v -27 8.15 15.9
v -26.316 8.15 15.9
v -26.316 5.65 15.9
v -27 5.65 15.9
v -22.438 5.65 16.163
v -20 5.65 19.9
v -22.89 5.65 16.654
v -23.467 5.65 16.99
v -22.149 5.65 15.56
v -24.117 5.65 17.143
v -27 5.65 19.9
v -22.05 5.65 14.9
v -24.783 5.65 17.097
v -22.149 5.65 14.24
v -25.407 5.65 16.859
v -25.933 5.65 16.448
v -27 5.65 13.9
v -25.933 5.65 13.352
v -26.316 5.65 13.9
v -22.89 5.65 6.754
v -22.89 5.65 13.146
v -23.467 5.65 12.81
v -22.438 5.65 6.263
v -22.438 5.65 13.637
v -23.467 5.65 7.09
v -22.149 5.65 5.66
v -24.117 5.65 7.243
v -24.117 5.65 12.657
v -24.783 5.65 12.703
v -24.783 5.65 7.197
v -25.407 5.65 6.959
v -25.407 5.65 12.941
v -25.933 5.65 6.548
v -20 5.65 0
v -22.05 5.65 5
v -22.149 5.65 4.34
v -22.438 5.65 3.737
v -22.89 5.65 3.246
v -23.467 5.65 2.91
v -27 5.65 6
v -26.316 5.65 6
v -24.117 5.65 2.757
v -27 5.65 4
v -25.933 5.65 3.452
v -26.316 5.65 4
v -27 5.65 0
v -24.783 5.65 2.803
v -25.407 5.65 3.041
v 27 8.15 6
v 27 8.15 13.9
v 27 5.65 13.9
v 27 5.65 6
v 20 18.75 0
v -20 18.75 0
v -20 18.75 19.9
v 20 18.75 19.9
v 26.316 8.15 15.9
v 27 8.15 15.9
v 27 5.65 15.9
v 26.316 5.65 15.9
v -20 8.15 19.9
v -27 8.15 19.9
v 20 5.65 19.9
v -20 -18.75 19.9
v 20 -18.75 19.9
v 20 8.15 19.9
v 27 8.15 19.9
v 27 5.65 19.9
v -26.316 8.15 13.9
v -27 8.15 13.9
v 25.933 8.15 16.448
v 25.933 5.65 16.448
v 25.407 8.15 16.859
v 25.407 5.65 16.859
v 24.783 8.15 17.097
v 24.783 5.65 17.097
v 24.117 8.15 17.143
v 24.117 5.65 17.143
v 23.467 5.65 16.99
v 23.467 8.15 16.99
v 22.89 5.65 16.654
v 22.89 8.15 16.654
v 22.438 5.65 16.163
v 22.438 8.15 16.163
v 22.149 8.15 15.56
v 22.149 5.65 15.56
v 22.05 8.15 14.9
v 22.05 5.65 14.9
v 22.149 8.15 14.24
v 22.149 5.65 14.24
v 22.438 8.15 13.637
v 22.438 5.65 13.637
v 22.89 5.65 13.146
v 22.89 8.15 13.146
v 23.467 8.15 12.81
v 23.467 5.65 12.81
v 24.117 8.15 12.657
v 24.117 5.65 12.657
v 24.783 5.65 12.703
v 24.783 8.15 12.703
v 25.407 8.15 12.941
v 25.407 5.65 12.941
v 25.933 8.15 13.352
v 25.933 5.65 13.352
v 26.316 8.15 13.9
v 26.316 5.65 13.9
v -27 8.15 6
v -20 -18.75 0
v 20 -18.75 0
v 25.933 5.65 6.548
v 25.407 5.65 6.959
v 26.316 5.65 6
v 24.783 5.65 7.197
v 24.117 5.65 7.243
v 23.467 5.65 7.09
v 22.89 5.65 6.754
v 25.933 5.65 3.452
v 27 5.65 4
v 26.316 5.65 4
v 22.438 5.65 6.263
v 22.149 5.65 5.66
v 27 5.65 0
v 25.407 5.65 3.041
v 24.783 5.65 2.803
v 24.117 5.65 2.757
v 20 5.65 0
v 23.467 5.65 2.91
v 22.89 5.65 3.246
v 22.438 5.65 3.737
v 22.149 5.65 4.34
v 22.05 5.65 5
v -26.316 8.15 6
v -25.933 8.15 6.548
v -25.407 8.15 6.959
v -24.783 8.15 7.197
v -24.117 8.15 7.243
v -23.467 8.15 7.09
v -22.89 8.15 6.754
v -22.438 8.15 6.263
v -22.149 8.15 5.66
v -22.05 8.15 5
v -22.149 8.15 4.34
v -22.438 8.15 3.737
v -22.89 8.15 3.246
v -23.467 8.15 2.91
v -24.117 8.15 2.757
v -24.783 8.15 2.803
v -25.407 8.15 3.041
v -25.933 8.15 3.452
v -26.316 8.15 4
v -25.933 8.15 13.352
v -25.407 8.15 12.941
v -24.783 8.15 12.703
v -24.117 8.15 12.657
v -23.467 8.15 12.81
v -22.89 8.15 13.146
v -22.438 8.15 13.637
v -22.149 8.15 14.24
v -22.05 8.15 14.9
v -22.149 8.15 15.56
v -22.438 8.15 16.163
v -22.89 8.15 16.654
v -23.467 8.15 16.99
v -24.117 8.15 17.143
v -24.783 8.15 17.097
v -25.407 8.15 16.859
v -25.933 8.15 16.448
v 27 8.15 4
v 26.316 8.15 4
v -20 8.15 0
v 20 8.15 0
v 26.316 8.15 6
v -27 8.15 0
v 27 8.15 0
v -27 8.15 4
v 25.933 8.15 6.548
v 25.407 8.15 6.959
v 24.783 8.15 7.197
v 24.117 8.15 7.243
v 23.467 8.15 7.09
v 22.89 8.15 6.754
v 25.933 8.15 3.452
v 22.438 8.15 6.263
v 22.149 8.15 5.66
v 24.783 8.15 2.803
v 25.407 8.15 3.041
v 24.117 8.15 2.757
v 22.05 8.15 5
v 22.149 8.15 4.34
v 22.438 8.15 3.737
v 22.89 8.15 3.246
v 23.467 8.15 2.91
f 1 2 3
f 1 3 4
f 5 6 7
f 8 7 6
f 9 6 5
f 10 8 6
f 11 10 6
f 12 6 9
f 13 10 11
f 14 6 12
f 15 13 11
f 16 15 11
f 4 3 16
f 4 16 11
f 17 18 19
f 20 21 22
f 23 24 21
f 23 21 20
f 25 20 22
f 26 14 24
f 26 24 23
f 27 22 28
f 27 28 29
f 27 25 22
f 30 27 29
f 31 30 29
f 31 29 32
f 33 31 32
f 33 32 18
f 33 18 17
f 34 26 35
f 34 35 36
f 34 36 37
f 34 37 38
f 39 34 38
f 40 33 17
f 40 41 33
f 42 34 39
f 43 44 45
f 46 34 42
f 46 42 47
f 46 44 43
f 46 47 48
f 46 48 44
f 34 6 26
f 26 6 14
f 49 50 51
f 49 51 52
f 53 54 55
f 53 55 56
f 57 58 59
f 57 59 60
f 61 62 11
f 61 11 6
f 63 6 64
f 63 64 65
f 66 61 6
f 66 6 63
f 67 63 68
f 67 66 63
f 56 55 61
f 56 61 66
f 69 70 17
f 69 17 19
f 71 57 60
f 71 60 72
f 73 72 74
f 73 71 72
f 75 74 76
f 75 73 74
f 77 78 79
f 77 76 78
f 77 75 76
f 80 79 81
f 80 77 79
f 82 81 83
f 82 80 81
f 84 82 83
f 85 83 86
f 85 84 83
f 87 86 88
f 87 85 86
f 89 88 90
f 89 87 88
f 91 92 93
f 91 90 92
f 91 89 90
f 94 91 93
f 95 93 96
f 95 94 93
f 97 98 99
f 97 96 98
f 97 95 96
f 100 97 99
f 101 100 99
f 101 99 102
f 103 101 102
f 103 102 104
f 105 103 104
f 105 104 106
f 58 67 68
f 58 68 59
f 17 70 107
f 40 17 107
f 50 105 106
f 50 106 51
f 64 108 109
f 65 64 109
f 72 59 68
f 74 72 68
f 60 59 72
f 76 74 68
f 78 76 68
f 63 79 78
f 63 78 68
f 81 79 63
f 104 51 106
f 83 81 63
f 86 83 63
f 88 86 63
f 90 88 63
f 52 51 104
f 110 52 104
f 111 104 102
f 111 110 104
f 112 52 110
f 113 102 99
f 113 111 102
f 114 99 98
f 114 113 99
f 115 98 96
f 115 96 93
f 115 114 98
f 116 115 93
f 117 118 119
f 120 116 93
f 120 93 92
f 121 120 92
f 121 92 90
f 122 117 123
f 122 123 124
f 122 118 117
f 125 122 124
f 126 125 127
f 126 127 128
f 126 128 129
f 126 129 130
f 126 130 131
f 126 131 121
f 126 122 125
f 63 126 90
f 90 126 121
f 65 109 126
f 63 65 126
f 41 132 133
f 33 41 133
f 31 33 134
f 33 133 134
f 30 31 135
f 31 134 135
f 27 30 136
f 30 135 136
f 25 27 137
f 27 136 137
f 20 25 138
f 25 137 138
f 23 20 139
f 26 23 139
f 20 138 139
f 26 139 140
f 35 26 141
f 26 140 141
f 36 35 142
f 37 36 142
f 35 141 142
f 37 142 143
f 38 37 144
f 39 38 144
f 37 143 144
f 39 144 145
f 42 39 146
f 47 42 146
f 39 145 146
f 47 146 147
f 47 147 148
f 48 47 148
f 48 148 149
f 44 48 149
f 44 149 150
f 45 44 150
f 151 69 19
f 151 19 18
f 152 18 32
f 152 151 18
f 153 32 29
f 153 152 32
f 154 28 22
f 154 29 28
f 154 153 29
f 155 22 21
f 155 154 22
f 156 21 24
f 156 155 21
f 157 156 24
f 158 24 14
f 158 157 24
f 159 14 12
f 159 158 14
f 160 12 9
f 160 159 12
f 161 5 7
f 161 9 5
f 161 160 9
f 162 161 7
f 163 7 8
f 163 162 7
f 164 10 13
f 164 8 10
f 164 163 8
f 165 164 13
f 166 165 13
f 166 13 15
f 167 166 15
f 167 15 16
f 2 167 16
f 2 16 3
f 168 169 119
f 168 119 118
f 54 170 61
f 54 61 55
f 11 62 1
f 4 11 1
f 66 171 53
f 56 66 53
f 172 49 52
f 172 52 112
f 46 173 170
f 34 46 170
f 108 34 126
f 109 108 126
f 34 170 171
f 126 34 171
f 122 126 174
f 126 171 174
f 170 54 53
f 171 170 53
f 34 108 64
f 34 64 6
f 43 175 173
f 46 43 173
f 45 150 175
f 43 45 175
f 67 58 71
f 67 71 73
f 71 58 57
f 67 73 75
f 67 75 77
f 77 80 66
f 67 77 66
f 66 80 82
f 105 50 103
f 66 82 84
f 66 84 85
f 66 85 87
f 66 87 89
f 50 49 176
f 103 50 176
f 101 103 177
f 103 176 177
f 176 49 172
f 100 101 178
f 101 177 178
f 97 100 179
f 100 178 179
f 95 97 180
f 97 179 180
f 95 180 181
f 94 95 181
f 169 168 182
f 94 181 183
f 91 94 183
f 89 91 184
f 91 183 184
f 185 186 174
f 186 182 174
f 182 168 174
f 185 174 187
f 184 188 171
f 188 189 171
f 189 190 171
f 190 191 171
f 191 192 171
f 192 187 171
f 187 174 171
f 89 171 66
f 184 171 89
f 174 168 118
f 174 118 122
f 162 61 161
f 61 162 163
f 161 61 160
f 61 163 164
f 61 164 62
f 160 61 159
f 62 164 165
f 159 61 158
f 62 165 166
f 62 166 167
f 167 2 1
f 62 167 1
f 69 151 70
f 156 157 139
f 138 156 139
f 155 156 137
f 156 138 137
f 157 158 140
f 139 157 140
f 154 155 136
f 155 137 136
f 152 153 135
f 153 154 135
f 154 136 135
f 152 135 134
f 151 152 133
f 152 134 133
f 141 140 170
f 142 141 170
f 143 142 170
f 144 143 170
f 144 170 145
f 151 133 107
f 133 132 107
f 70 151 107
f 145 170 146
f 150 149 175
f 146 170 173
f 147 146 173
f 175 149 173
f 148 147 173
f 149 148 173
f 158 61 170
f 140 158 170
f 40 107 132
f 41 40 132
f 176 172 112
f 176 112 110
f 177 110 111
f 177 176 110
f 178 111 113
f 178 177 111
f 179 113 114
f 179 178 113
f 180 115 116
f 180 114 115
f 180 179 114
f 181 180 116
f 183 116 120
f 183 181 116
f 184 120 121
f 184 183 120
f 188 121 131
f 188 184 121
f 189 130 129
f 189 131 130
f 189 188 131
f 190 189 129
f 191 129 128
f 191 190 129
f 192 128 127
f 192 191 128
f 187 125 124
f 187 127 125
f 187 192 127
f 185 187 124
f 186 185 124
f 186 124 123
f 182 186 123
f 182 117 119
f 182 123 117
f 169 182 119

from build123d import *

# Parameters (mm, degrees)
SKETCH_1_W          = 40
SKETCH_1_H          = 37.5
EXTRUDE_1_DEPTH     = 19.9
SKETCH_2_W          = 7
SKETCH_2_H          = 19.9
EXTRUDE_2_DEPTH     = 2.5
CUT_EXTRUDE_1_DEPTH = 43.995581168


with BuildPart() as part:
    # 草图1 → 凸台-拉伸1 (new body)
    with BuildSketch(Plane.XY):
        Rectangle(SKETCH_1_W, SKETCH_1_H)
    extrude(amount=EXTRUDE_1_DEPTH)

    # 草图2 → 凸台-拉伸2 (add)
    with BuildSketch(Plane(origin=(0, 8.15, 0), x_dir=(-1, 0, 0), z_dir=(0, -1, 0))):
        with Locations((23.5, -9.95)):
            Rectangle(SKETCH_2_W, SKETCH_2_H)
        with Locations((-23.5, -9.95)):
            Rectangle(SKETCH_2_W, SKETCH_2_H)
    extrude(amount=EXTRUDE_2_DEPTH)

    # 草图3 → 切除-拉伸1 (cut, through all)
    with BuildSketch(Plane(origin=(0, 8.15, 0), x_dir=(1, 0, 0), z_dir=(0, 1, 0))):
        with BuildLine():
            Line((27, -15.9), (26.315564437, -15.9))
            ThreePointArc((26.315564437, -15.9), (22.05, -14.9), (26.315564437, -13.9))
            Line((26.315564437, -13.9), (27, -13.9))
            Line((27, -13.9), (27, -15.9))
        make_face()
        with BuildLine():
            Line((27, -6), (26.315564437, -6))
            ThreePointArc((26.315564437, -6), (22.05, -5), (26.315564437, -4))
            Line((26.315564437, -4), (27, -4))
            Line((27, -4), (27, -6))
        make_face()
        with BuildLine():
            Line((-27, -15.9), (-27, -13.9))
            Line((-27, -13.9), (-26.315564437, -13.9))
            ThreePointArc((-26.315564437, -13.9), (-22.05, -14.9), (-26.315564437, -15.9))
            Line((-26.315564437, -15.9), (-27, -15.9))
        make_face()
        with BuildLine():
            Line((-27, -4), (-27, -6))
            Line((-27, -6), (-26.315564437, -6))
            ThreePointArc((-26.315564437, -6), (-22.05, -5), (-26.315564437, -4))
            Line((-26.315564437, -4), (-27, -4))
        make_face()
    extrude(amount=-CUT_EXTRUDE_1_DEPTH, mode=Mode.SUBTRACT)


solid = part.part
